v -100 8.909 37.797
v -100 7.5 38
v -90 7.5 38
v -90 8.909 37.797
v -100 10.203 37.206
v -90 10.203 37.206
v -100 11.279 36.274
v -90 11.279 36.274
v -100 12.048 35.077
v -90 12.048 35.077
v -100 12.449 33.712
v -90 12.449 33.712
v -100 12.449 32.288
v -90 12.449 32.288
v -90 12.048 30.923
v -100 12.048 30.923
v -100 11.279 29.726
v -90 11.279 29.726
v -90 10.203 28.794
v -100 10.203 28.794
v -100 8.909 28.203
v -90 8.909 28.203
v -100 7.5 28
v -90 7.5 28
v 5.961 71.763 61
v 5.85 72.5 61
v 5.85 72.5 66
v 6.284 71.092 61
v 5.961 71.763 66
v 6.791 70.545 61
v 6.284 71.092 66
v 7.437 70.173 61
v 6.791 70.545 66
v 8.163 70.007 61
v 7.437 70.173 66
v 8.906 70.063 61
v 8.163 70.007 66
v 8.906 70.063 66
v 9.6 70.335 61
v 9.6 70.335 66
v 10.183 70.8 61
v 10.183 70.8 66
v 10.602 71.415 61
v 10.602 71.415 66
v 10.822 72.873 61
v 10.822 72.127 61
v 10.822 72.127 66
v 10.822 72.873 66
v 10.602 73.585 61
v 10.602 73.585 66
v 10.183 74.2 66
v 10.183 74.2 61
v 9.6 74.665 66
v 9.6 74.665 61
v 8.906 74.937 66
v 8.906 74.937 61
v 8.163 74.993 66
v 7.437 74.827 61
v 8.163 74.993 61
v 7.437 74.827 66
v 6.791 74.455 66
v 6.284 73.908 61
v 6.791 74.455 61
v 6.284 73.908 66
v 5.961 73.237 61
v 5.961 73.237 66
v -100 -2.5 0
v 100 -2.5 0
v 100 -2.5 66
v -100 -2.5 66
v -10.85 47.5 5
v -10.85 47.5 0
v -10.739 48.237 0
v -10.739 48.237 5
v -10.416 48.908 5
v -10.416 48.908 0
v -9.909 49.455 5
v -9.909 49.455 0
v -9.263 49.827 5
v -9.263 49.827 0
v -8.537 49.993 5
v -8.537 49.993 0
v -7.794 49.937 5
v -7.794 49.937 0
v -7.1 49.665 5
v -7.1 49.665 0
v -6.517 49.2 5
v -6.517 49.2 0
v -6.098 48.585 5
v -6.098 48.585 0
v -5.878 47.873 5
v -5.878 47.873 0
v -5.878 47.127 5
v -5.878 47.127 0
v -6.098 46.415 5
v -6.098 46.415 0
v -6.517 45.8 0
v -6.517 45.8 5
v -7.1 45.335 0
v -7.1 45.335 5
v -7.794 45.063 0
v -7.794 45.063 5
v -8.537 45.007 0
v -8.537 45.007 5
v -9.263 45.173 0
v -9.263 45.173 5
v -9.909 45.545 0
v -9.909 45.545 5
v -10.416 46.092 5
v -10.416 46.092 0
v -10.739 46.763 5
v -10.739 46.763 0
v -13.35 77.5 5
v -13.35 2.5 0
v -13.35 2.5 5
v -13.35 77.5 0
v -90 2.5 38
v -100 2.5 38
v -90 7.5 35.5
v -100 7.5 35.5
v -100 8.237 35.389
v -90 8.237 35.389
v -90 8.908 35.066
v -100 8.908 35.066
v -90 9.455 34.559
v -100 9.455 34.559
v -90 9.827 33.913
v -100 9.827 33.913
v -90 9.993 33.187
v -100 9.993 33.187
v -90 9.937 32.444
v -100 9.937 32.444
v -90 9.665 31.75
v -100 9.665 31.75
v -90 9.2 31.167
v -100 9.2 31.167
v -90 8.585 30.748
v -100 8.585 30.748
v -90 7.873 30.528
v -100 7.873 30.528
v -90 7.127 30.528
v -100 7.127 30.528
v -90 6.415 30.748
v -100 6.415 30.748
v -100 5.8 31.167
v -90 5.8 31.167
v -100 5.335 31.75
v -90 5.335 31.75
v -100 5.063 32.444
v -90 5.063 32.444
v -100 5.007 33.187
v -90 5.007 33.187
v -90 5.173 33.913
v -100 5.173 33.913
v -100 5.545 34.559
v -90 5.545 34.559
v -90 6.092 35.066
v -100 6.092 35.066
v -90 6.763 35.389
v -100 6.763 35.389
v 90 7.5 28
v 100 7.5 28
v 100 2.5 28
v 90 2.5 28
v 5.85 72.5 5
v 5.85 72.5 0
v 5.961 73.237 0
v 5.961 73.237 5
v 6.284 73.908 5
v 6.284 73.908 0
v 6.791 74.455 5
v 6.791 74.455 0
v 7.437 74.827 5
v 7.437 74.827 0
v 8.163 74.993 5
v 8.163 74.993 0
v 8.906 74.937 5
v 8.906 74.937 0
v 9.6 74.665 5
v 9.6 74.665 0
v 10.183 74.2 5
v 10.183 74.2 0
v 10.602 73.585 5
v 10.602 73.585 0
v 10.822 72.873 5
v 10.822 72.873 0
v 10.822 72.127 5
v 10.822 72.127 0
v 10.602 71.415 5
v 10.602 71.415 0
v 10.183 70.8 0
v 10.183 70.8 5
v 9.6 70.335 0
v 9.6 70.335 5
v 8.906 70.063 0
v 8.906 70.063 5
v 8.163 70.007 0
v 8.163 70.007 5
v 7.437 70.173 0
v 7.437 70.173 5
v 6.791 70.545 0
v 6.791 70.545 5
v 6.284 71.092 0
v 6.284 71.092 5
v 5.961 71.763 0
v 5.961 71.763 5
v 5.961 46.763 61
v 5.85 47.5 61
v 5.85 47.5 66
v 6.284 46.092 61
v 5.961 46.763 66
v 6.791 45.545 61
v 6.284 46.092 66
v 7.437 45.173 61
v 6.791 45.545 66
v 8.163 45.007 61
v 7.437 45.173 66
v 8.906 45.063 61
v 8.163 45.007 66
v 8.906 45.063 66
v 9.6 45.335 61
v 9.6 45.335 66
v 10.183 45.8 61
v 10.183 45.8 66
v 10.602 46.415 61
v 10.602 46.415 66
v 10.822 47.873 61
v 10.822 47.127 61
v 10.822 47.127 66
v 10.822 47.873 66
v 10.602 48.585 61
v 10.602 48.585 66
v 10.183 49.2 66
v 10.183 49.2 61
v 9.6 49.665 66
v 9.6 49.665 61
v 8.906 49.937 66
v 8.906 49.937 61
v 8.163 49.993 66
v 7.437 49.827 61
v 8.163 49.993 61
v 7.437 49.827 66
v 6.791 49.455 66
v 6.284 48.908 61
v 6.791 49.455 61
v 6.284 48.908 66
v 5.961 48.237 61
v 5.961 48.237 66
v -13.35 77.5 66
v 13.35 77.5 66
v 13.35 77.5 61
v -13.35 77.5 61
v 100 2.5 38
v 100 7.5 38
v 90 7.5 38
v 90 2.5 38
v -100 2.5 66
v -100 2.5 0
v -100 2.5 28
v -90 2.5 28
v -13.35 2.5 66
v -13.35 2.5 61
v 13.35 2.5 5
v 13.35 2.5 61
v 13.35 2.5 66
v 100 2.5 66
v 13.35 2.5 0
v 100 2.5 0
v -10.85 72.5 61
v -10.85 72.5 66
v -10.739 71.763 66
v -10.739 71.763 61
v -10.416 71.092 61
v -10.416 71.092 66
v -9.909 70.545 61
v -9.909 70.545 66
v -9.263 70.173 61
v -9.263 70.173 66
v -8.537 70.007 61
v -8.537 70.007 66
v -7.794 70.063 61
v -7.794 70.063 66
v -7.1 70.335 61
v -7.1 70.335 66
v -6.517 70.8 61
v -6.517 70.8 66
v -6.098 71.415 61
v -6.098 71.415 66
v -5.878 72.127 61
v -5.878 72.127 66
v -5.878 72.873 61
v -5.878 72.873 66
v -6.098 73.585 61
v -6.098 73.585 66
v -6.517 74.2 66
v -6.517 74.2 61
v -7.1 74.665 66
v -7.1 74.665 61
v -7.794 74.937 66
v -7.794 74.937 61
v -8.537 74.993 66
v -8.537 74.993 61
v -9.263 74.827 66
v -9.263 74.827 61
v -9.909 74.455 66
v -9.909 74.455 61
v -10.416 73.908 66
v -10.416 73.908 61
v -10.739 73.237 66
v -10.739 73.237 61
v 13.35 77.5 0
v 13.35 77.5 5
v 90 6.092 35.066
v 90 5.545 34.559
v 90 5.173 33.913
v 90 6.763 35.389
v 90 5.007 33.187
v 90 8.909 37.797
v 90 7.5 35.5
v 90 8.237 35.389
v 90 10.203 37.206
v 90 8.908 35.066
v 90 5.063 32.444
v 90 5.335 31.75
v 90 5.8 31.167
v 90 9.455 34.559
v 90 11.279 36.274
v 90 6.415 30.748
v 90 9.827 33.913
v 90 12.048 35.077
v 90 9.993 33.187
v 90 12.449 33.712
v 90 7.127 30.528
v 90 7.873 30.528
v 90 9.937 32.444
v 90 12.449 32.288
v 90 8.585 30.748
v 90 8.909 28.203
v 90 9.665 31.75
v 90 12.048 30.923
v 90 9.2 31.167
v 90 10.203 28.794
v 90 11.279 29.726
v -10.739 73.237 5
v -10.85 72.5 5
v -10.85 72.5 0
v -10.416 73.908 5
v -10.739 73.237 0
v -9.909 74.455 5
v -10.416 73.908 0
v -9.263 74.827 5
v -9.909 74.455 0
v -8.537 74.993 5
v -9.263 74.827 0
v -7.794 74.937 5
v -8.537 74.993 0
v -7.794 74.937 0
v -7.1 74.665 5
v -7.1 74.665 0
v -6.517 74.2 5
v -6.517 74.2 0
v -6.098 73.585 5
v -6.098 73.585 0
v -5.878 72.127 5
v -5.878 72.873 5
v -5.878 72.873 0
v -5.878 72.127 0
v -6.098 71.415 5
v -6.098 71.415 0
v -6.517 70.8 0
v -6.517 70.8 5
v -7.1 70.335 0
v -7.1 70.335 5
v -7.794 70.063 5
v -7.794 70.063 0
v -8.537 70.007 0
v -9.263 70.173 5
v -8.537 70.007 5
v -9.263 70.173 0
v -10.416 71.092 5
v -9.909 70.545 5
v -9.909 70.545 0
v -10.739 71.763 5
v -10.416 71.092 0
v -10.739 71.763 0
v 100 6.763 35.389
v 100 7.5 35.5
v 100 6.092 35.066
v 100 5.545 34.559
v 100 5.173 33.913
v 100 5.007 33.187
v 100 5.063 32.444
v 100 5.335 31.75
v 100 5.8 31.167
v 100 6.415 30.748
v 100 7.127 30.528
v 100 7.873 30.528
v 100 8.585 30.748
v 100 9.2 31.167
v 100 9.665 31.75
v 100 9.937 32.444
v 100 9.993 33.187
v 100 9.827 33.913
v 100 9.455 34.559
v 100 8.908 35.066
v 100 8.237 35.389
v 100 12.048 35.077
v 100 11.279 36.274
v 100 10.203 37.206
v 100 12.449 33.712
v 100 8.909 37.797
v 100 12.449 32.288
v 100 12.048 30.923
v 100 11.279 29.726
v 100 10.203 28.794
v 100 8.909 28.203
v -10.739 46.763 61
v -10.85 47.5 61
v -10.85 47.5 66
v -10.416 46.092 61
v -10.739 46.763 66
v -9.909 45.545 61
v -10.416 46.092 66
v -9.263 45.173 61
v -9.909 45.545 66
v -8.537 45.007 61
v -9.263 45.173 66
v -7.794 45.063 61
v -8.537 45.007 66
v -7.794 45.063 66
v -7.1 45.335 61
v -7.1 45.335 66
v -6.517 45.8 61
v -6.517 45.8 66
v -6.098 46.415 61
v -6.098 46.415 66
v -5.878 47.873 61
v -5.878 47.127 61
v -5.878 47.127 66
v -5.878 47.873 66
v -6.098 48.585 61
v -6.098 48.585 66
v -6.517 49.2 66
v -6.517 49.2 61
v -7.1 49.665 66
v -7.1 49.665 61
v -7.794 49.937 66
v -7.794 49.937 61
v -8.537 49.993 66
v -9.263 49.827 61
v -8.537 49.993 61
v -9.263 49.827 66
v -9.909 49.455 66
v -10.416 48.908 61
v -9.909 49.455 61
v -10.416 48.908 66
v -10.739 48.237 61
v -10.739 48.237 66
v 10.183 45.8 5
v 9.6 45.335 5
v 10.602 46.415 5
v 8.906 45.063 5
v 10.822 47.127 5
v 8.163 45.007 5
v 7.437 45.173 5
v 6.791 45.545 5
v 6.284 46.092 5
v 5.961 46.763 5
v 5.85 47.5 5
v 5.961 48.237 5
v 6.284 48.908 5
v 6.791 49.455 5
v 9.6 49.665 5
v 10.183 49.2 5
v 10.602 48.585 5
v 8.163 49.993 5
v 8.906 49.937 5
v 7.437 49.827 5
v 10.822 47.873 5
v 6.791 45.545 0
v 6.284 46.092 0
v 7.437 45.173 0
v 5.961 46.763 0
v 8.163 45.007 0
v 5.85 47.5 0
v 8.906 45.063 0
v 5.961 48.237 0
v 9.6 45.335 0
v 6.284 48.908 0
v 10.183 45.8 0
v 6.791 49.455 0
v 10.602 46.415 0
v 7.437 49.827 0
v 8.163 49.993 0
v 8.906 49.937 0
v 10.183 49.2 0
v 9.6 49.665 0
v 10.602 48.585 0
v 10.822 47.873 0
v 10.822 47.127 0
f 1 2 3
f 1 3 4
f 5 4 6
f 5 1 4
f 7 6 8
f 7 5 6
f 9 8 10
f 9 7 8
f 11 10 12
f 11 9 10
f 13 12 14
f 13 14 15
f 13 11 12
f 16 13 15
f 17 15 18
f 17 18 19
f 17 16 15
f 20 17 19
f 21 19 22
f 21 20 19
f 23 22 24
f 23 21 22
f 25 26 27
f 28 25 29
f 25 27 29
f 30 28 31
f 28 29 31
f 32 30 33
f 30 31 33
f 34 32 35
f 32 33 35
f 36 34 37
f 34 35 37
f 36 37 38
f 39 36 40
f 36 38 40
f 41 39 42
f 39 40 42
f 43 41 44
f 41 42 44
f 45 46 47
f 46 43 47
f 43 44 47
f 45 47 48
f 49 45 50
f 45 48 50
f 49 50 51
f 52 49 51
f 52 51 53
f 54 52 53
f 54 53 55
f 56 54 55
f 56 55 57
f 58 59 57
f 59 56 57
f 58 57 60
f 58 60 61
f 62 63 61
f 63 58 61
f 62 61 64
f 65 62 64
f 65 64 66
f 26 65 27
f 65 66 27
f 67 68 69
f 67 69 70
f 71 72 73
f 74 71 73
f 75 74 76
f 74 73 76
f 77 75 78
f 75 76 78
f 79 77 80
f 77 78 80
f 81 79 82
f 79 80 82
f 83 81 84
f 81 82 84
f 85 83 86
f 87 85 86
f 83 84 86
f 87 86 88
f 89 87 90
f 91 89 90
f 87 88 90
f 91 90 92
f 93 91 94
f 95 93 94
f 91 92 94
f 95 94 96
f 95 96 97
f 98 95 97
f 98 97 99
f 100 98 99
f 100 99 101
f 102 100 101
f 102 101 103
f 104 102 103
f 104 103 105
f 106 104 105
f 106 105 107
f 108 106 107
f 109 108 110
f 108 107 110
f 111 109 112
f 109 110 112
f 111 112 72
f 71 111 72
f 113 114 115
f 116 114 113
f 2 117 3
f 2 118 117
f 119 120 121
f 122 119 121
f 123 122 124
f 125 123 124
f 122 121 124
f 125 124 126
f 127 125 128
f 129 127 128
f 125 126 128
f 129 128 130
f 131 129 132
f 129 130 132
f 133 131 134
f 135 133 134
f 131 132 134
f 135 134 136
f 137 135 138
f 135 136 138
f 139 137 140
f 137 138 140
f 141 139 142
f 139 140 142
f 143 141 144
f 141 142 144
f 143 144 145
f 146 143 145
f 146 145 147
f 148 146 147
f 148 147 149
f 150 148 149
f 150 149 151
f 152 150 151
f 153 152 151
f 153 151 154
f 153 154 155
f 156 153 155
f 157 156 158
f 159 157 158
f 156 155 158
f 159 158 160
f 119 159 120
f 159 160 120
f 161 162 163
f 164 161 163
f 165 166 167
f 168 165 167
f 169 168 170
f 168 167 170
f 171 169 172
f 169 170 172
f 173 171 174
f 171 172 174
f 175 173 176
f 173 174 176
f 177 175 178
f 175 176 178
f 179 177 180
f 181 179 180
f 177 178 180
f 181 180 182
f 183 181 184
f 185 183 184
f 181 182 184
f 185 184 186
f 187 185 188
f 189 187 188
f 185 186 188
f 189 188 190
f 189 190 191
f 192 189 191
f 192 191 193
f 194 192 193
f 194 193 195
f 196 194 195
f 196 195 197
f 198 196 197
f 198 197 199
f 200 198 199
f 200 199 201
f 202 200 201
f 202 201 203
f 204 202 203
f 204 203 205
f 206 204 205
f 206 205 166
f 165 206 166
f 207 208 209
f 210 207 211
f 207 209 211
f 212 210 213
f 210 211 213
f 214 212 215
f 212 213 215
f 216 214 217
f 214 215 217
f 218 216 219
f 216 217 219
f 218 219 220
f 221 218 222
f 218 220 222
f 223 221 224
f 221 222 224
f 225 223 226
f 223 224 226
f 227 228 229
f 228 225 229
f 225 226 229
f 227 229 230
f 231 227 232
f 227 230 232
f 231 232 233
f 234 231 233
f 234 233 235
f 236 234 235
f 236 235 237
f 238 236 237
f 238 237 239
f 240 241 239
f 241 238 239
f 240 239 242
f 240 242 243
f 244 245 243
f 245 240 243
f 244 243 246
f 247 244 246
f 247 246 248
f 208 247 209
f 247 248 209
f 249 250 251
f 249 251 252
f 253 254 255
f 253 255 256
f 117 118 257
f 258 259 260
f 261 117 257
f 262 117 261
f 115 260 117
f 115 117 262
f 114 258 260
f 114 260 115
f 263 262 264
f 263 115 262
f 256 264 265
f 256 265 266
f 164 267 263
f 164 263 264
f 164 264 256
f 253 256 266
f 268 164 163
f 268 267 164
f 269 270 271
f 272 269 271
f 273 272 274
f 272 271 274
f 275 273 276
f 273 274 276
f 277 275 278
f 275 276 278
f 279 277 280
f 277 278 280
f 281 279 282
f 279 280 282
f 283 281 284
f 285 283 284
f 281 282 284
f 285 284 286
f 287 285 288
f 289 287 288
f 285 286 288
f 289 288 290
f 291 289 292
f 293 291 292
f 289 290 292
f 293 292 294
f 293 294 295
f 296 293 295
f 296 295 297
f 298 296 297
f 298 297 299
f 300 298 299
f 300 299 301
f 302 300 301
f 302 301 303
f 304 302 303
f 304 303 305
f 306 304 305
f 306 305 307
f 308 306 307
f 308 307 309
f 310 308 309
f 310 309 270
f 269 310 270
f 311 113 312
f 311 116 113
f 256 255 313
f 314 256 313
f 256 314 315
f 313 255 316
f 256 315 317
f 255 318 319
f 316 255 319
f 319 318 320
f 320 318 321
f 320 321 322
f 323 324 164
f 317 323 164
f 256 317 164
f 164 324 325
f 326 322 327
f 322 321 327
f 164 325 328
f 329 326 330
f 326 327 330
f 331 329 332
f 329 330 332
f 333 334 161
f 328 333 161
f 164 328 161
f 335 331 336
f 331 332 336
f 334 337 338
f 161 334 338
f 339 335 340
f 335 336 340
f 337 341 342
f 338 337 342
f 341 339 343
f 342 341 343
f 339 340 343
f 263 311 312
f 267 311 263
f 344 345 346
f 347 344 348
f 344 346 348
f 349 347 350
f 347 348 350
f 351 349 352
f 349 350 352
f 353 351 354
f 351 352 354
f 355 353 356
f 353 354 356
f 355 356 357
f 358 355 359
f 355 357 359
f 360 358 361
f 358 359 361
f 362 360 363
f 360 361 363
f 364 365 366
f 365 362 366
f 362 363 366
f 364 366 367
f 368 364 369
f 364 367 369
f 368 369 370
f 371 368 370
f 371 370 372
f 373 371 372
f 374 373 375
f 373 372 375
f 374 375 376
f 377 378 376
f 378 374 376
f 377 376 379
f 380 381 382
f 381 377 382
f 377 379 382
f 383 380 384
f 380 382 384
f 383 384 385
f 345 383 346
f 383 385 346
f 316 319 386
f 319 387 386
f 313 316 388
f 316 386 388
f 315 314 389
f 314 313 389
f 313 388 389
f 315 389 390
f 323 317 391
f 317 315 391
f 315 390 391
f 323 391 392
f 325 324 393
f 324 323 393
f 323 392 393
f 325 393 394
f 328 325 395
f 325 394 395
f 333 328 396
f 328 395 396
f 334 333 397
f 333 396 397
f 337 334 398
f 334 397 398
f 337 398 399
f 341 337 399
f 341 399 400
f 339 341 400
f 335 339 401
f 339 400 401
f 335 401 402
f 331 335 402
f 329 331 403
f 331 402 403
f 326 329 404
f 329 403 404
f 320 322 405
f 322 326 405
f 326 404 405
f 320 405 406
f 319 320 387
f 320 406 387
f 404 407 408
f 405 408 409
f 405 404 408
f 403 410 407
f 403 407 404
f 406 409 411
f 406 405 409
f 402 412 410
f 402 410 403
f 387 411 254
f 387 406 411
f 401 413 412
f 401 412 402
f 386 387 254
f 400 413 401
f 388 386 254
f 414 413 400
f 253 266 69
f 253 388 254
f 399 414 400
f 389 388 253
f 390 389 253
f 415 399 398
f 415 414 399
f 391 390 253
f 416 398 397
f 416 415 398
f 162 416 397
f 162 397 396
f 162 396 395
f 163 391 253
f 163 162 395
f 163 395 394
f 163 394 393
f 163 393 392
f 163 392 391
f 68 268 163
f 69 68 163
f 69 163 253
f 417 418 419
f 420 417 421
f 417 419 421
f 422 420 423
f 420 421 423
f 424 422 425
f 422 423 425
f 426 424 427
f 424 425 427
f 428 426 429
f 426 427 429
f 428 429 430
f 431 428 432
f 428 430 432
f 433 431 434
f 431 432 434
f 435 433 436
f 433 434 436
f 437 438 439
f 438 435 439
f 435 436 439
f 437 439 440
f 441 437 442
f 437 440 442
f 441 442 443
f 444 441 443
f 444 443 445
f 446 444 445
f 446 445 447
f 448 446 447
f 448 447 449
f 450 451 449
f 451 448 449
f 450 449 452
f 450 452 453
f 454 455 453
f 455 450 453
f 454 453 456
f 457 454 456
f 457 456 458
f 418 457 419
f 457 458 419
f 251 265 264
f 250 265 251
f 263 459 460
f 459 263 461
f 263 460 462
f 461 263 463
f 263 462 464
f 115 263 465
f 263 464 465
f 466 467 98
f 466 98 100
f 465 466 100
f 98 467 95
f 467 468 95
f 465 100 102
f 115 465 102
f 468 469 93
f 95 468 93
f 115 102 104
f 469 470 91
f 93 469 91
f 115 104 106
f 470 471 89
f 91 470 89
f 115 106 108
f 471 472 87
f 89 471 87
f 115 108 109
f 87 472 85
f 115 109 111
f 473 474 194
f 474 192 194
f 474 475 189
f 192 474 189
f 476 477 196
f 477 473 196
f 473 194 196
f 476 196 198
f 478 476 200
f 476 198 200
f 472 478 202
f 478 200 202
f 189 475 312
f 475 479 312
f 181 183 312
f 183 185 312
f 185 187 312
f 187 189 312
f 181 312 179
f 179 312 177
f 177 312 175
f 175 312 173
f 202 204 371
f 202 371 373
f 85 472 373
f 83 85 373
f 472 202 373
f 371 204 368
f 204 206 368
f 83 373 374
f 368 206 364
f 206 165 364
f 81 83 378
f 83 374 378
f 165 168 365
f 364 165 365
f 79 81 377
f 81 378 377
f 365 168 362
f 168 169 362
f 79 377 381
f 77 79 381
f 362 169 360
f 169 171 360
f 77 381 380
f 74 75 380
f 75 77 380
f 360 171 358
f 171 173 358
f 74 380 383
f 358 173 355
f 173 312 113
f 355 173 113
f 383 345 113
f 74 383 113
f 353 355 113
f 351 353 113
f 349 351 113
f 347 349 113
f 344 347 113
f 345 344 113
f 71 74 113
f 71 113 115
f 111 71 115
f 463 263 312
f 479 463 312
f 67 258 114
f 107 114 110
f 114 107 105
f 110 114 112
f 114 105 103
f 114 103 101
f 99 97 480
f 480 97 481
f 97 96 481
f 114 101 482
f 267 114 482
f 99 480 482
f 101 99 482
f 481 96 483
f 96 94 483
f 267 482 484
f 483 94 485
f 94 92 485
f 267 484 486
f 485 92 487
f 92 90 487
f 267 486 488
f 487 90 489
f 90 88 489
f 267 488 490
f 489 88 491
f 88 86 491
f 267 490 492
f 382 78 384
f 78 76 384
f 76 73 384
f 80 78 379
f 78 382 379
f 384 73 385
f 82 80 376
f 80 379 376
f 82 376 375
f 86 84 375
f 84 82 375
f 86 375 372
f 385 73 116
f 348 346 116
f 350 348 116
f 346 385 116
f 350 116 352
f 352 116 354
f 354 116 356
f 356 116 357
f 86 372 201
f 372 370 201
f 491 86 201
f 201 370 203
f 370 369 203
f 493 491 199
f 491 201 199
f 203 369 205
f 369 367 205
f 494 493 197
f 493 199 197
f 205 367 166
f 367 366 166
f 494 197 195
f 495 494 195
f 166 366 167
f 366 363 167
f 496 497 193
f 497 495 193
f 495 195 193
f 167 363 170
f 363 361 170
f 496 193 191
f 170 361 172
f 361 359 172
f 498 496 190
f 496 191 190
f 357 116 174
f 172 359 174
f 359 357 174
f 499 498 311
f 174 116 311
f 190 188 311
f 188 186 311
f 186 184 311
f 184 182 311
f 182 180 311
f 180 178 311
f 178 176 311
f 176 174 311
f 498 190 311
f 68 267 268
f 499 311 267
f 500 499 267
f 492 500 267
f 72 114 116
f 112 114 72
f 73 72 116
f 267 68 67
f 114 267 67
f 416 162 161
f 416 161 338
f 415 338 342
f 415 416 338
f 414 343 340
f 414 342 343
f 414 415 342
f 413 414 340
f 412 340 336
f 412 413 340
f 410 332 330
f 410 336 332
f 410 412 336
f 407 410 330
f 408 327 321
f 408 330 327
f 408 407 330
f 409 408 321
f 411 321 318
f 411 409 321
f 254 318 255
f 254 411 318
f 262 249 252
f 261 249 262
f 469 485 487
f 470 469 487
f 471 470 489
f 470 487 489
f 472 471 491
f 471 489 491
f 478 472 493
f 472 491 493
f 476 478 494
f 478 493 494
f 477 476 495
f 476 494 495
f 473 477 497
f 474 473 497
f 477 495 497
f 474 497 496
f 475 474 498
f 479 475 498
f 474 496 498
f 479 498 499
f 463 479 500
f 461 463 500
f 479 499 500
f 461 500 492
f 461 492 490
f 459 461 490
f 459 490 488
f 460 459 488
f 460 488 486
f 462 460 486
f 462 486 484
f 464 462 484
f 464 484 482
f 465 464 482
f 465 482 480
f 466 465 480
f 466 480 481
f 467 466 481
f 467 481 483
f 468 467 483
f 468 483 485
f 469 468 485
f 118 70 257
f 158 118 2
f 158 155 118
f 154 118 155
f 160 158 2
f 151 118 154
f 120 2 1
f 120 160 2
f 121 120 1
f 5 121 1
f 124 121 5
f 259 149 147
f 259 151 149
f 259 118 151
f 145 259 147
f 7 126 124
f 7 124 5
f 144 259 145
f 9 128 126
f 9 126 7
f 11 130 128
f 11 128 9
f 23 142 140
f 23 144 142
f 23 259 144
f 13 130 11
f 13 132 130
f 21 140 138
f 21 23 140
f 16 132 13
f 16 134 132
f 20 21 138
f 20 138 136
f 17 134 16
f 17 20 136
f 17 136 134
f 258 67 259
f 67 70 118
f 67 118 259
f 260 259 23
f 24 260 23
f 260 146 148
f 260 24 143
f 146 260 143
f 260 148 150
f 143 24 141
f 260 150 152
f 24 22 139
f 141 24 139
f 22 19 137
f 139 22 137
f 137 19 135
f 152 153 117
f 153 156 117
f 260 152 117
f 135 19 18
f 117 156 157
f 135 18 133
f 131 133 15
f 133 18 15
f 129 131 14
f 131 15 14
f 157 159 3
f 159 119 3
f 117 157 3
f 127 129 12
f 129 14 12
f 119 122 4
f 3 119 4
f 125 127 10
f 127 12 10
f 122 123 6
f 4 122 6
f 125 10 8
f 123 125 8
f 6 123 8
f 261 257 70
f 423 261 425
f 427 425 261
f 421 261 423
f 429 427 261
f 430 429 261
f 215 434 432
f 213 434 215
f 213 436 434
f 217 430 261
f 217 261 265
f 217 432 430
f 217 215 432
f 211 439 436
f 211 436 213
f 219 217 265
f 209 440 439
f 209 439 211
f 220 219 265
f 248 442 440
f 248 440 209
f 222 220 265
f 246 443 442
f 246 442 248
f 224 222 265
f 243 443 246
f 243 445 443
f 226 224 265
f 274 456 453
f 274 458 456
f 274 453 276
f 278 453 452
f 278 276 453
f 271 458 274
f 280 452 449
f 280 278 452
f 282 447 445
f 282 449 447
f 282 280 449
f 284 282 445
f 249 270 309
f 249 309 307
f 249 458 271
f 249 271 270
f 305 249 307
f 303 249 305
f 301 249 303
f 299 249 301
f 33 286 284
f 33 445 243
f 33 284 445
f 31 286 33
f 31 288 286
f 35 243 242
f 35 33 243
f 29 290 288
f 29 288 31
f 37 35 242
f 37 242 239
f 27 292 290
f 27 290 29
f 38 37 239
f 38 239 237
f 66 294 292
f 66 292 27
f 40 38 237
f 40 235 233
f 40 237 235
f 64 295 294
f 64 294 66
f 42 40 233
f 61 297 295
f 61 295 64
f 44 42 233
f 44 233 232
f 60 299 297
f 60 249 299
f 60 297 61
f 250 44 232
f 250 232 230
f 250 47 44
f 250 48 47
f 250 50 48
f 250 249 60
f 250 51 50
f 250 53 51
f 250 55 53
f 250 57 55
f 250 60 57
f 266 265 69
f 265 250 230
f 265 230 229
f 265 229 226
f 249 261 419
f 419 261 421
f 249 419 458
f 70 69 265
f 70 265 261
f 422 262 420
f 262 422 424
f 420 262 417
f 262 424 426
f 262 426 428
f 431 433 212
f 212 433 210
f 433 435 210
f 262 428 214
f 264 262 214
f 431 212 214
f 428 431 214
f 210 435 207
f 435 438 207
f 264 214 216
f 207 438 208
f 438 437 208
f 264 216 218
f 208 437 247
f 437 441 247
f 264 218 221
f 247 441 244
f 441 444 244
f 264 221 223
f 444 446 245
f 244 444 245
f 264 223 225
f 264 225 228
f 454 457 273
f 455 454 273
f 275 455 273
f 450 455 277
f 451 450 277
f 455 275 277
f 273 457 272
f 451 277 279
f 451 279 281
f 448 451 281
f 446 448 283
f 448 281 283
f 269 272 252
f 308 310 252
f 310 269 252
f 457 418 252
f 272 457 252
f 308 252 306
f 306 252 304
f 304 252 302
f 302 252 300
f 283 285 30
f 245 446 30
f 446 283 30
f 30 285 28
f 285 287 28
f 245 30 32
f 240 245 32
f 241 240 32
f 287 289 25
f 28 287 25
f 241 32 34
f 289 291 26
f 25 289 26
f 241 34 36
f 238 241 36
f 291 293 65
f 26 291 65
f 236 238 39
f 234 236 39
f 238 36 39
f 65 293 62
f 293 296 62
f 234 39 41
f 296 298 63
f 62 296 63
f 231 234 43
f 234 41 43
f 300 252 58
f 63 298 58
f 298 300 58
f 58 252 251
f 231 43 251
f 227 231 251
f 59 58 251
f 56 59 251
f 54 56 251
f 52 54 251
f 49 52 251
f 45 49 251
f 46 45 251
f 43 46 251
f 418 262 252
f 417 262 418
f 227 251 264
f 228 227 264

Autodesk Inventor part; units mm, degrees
ref_plane "YZ Plane" through (0, 0, 0) normal (1, 0, 0) x (0, 1, 0)
sketch "Sketch1" plane through (0, 0, 0) normal (0, 0, 1) x (1, 0, 0)
  line L0 (100, -2.5) -> (-100, -2.5)
  line L1 (-100, -2.5) -> (-100, 2.5)
  line L2 (-100, 2.5) -> (100, 2.5)
  line L3 (100, 2.5) -> (100, -2.5)
  line L4 (100, -2.5) -> (-100, 2.5) construction
  line L5 (-100, -2.5) -> (100, 2.5) construction
  point P0 (0, 0)
  dimension "d0" = 200
  dimension "d1" = 5
extrude "Extrusion1" add sketch "Sketch1" along normal blind 66
sketch "Sketch2" plane through (0, 0, 0) normal (0, 0, -1) x (-1, 0, 0)
  line L0 (-8.35, 72.5) -> (8.35, 72.5)
  line L1 (8.35, 72.5) -> (8.35, 47.5)
  line L2 (8.35, 47.5) -> (-8.35, 47.5)
  line L3 (-8.35, 47.5) -> (-8.35, 72.5)
  line L4 (-8.35, 72.5) -> (8.35, 47.5) construction
  line L5 (8.35, 72.5) -> (-8.35, 47.5) construction
  line L6 (-13.35, -2.5) -> (13.35, -2.5)
  line L7 (13.35, -2.5) -> (13.35, 77.5)
  line L8 (13.35, 77.5) -> (-13.35, 77.5)
  line L9 (-13.35, 77.5) -> (-13.35, -2.5)
  line L10 (-13.35, -2.5) -> (13.35, 77.5) construction
  line L11 (13.35, -2.5) -> (-13.35, 77.5) construction
  circle A0 centre (-8.35, 47.5) radius 2.5
  circle A1 centre (8.35, 47.5) radius 2.5
  circle A2 centre (8.35, 72.5) radius 2.5
  circle A3 centre (-8.35, 72.5) radius 2.5
  line L12 (-100, 2.5) -> (100, 2.5) projected
  line L13 (100, -2.5) -> (-100, -2.5) projected
  point P0 (0, -2.5)
  dimension "d4" = 25
  dimension "d5" = 16.7
  dimension "d6" = 5
  dimension "d7" = 5
  dimension "d8" = 5
  dimension "d11" = 5
  dimension "d12" = 5
  dimension "d13" = 5
  dimension "d14" = 5
  dimension "d33" = 50
extrude "Extrusion3" cut sketch "Sketch2" along normal blind 5 contours L3 A3 L0 | L0 A3 L3 | A2 L1 L0 | L0 L1 A2 | A0 L2 L3 | L3 L2 A0 | A1 L2 L1 | L1 L2 A1
sketch "Sketch3" plane through (-100, 2.5, 66) normal (0, 1, 0) x (1, 0, 0)
  line L0 (200, 66) -> (0, 66) projected
  line L1 (0, 66) -> (0, 0) projected
  line L2 (200, 0) -> (0, 0) projected
  line L3 (200, 66) -> (200, 0) projected
  line L4 (0, 66) -> (0, 0) projected
  line L5 (200, 66) -> (200, 0) projected
  line L6 (100, 33) -> (100, 66)
  line L7 (100, 33) -> (100, 0)
  line L8 (0, 0) -> (200, 0) projected
  line L9 (100, 33) -> (200, 33)
  circle A0 centre (100, 33) radius 4
  circle A1 centre (150, 33) radius 4
  line L10 (100, 33) -> (200, 33)
  line L11 (200, 66) -> (200, 0) projected
  line L12 (150, 33) -> (100, 33)
  dimension "d17" = 8
  dimension "d18" = 8
  dimension "d23" = 50
sketch "Sketch5" plane through (-100, -2.5, 0) normal (-1, 0, 0) x (0, 0, 1)
  circle A0 centre (33, 10) radius 2.5
  circle A1 centre (33, 10) radius 5
  line L0 (0, 5) -> (0, 20) projected
  line L1 (0, 5) -> (66, 5)
  line L2 (0, 5) -> (66, 5) projected
  line L3 (28, 5) -> (28, 10)
  line L4 (38, 5) -> (38, 10)
  point P0 (0, 2.5)
  point P1 (33, 5)
  point P2 (28, 5)
  point P3 (38, 5)
  dimension "d29" = 5
  dimension "d30" = 10
extrude "Extrusion7" add sketch "Sketch5" against normal blind 10
ref_plane "Work Plane2" through (0, -2.5, 0) normal (-1, 0, 0) x (0, 0, 1)
mirror "Mirror2" about plane through (0, -2.5, 0) normal (-1, 0, 0) of "Extrusion7"
extrude "Extrusion8" add sketch "Sketch2" against normal blind 5 contours L0 A2 L1 A1 L2 A0 L3 A3 | L9 L12 L7 L6 | L9 L8 L7 L12
ref_plane "Work Plane3" through (0, 0, 33) normal (0, 0, -1) x (-1, 0, 0)
mirror "Mirror3" about plane through (0, 0, 33) normal (0, 0, -1) of "Extrusion8"
properties part number "FP V2 Mounting Plate" material "Aluminum 6061"
